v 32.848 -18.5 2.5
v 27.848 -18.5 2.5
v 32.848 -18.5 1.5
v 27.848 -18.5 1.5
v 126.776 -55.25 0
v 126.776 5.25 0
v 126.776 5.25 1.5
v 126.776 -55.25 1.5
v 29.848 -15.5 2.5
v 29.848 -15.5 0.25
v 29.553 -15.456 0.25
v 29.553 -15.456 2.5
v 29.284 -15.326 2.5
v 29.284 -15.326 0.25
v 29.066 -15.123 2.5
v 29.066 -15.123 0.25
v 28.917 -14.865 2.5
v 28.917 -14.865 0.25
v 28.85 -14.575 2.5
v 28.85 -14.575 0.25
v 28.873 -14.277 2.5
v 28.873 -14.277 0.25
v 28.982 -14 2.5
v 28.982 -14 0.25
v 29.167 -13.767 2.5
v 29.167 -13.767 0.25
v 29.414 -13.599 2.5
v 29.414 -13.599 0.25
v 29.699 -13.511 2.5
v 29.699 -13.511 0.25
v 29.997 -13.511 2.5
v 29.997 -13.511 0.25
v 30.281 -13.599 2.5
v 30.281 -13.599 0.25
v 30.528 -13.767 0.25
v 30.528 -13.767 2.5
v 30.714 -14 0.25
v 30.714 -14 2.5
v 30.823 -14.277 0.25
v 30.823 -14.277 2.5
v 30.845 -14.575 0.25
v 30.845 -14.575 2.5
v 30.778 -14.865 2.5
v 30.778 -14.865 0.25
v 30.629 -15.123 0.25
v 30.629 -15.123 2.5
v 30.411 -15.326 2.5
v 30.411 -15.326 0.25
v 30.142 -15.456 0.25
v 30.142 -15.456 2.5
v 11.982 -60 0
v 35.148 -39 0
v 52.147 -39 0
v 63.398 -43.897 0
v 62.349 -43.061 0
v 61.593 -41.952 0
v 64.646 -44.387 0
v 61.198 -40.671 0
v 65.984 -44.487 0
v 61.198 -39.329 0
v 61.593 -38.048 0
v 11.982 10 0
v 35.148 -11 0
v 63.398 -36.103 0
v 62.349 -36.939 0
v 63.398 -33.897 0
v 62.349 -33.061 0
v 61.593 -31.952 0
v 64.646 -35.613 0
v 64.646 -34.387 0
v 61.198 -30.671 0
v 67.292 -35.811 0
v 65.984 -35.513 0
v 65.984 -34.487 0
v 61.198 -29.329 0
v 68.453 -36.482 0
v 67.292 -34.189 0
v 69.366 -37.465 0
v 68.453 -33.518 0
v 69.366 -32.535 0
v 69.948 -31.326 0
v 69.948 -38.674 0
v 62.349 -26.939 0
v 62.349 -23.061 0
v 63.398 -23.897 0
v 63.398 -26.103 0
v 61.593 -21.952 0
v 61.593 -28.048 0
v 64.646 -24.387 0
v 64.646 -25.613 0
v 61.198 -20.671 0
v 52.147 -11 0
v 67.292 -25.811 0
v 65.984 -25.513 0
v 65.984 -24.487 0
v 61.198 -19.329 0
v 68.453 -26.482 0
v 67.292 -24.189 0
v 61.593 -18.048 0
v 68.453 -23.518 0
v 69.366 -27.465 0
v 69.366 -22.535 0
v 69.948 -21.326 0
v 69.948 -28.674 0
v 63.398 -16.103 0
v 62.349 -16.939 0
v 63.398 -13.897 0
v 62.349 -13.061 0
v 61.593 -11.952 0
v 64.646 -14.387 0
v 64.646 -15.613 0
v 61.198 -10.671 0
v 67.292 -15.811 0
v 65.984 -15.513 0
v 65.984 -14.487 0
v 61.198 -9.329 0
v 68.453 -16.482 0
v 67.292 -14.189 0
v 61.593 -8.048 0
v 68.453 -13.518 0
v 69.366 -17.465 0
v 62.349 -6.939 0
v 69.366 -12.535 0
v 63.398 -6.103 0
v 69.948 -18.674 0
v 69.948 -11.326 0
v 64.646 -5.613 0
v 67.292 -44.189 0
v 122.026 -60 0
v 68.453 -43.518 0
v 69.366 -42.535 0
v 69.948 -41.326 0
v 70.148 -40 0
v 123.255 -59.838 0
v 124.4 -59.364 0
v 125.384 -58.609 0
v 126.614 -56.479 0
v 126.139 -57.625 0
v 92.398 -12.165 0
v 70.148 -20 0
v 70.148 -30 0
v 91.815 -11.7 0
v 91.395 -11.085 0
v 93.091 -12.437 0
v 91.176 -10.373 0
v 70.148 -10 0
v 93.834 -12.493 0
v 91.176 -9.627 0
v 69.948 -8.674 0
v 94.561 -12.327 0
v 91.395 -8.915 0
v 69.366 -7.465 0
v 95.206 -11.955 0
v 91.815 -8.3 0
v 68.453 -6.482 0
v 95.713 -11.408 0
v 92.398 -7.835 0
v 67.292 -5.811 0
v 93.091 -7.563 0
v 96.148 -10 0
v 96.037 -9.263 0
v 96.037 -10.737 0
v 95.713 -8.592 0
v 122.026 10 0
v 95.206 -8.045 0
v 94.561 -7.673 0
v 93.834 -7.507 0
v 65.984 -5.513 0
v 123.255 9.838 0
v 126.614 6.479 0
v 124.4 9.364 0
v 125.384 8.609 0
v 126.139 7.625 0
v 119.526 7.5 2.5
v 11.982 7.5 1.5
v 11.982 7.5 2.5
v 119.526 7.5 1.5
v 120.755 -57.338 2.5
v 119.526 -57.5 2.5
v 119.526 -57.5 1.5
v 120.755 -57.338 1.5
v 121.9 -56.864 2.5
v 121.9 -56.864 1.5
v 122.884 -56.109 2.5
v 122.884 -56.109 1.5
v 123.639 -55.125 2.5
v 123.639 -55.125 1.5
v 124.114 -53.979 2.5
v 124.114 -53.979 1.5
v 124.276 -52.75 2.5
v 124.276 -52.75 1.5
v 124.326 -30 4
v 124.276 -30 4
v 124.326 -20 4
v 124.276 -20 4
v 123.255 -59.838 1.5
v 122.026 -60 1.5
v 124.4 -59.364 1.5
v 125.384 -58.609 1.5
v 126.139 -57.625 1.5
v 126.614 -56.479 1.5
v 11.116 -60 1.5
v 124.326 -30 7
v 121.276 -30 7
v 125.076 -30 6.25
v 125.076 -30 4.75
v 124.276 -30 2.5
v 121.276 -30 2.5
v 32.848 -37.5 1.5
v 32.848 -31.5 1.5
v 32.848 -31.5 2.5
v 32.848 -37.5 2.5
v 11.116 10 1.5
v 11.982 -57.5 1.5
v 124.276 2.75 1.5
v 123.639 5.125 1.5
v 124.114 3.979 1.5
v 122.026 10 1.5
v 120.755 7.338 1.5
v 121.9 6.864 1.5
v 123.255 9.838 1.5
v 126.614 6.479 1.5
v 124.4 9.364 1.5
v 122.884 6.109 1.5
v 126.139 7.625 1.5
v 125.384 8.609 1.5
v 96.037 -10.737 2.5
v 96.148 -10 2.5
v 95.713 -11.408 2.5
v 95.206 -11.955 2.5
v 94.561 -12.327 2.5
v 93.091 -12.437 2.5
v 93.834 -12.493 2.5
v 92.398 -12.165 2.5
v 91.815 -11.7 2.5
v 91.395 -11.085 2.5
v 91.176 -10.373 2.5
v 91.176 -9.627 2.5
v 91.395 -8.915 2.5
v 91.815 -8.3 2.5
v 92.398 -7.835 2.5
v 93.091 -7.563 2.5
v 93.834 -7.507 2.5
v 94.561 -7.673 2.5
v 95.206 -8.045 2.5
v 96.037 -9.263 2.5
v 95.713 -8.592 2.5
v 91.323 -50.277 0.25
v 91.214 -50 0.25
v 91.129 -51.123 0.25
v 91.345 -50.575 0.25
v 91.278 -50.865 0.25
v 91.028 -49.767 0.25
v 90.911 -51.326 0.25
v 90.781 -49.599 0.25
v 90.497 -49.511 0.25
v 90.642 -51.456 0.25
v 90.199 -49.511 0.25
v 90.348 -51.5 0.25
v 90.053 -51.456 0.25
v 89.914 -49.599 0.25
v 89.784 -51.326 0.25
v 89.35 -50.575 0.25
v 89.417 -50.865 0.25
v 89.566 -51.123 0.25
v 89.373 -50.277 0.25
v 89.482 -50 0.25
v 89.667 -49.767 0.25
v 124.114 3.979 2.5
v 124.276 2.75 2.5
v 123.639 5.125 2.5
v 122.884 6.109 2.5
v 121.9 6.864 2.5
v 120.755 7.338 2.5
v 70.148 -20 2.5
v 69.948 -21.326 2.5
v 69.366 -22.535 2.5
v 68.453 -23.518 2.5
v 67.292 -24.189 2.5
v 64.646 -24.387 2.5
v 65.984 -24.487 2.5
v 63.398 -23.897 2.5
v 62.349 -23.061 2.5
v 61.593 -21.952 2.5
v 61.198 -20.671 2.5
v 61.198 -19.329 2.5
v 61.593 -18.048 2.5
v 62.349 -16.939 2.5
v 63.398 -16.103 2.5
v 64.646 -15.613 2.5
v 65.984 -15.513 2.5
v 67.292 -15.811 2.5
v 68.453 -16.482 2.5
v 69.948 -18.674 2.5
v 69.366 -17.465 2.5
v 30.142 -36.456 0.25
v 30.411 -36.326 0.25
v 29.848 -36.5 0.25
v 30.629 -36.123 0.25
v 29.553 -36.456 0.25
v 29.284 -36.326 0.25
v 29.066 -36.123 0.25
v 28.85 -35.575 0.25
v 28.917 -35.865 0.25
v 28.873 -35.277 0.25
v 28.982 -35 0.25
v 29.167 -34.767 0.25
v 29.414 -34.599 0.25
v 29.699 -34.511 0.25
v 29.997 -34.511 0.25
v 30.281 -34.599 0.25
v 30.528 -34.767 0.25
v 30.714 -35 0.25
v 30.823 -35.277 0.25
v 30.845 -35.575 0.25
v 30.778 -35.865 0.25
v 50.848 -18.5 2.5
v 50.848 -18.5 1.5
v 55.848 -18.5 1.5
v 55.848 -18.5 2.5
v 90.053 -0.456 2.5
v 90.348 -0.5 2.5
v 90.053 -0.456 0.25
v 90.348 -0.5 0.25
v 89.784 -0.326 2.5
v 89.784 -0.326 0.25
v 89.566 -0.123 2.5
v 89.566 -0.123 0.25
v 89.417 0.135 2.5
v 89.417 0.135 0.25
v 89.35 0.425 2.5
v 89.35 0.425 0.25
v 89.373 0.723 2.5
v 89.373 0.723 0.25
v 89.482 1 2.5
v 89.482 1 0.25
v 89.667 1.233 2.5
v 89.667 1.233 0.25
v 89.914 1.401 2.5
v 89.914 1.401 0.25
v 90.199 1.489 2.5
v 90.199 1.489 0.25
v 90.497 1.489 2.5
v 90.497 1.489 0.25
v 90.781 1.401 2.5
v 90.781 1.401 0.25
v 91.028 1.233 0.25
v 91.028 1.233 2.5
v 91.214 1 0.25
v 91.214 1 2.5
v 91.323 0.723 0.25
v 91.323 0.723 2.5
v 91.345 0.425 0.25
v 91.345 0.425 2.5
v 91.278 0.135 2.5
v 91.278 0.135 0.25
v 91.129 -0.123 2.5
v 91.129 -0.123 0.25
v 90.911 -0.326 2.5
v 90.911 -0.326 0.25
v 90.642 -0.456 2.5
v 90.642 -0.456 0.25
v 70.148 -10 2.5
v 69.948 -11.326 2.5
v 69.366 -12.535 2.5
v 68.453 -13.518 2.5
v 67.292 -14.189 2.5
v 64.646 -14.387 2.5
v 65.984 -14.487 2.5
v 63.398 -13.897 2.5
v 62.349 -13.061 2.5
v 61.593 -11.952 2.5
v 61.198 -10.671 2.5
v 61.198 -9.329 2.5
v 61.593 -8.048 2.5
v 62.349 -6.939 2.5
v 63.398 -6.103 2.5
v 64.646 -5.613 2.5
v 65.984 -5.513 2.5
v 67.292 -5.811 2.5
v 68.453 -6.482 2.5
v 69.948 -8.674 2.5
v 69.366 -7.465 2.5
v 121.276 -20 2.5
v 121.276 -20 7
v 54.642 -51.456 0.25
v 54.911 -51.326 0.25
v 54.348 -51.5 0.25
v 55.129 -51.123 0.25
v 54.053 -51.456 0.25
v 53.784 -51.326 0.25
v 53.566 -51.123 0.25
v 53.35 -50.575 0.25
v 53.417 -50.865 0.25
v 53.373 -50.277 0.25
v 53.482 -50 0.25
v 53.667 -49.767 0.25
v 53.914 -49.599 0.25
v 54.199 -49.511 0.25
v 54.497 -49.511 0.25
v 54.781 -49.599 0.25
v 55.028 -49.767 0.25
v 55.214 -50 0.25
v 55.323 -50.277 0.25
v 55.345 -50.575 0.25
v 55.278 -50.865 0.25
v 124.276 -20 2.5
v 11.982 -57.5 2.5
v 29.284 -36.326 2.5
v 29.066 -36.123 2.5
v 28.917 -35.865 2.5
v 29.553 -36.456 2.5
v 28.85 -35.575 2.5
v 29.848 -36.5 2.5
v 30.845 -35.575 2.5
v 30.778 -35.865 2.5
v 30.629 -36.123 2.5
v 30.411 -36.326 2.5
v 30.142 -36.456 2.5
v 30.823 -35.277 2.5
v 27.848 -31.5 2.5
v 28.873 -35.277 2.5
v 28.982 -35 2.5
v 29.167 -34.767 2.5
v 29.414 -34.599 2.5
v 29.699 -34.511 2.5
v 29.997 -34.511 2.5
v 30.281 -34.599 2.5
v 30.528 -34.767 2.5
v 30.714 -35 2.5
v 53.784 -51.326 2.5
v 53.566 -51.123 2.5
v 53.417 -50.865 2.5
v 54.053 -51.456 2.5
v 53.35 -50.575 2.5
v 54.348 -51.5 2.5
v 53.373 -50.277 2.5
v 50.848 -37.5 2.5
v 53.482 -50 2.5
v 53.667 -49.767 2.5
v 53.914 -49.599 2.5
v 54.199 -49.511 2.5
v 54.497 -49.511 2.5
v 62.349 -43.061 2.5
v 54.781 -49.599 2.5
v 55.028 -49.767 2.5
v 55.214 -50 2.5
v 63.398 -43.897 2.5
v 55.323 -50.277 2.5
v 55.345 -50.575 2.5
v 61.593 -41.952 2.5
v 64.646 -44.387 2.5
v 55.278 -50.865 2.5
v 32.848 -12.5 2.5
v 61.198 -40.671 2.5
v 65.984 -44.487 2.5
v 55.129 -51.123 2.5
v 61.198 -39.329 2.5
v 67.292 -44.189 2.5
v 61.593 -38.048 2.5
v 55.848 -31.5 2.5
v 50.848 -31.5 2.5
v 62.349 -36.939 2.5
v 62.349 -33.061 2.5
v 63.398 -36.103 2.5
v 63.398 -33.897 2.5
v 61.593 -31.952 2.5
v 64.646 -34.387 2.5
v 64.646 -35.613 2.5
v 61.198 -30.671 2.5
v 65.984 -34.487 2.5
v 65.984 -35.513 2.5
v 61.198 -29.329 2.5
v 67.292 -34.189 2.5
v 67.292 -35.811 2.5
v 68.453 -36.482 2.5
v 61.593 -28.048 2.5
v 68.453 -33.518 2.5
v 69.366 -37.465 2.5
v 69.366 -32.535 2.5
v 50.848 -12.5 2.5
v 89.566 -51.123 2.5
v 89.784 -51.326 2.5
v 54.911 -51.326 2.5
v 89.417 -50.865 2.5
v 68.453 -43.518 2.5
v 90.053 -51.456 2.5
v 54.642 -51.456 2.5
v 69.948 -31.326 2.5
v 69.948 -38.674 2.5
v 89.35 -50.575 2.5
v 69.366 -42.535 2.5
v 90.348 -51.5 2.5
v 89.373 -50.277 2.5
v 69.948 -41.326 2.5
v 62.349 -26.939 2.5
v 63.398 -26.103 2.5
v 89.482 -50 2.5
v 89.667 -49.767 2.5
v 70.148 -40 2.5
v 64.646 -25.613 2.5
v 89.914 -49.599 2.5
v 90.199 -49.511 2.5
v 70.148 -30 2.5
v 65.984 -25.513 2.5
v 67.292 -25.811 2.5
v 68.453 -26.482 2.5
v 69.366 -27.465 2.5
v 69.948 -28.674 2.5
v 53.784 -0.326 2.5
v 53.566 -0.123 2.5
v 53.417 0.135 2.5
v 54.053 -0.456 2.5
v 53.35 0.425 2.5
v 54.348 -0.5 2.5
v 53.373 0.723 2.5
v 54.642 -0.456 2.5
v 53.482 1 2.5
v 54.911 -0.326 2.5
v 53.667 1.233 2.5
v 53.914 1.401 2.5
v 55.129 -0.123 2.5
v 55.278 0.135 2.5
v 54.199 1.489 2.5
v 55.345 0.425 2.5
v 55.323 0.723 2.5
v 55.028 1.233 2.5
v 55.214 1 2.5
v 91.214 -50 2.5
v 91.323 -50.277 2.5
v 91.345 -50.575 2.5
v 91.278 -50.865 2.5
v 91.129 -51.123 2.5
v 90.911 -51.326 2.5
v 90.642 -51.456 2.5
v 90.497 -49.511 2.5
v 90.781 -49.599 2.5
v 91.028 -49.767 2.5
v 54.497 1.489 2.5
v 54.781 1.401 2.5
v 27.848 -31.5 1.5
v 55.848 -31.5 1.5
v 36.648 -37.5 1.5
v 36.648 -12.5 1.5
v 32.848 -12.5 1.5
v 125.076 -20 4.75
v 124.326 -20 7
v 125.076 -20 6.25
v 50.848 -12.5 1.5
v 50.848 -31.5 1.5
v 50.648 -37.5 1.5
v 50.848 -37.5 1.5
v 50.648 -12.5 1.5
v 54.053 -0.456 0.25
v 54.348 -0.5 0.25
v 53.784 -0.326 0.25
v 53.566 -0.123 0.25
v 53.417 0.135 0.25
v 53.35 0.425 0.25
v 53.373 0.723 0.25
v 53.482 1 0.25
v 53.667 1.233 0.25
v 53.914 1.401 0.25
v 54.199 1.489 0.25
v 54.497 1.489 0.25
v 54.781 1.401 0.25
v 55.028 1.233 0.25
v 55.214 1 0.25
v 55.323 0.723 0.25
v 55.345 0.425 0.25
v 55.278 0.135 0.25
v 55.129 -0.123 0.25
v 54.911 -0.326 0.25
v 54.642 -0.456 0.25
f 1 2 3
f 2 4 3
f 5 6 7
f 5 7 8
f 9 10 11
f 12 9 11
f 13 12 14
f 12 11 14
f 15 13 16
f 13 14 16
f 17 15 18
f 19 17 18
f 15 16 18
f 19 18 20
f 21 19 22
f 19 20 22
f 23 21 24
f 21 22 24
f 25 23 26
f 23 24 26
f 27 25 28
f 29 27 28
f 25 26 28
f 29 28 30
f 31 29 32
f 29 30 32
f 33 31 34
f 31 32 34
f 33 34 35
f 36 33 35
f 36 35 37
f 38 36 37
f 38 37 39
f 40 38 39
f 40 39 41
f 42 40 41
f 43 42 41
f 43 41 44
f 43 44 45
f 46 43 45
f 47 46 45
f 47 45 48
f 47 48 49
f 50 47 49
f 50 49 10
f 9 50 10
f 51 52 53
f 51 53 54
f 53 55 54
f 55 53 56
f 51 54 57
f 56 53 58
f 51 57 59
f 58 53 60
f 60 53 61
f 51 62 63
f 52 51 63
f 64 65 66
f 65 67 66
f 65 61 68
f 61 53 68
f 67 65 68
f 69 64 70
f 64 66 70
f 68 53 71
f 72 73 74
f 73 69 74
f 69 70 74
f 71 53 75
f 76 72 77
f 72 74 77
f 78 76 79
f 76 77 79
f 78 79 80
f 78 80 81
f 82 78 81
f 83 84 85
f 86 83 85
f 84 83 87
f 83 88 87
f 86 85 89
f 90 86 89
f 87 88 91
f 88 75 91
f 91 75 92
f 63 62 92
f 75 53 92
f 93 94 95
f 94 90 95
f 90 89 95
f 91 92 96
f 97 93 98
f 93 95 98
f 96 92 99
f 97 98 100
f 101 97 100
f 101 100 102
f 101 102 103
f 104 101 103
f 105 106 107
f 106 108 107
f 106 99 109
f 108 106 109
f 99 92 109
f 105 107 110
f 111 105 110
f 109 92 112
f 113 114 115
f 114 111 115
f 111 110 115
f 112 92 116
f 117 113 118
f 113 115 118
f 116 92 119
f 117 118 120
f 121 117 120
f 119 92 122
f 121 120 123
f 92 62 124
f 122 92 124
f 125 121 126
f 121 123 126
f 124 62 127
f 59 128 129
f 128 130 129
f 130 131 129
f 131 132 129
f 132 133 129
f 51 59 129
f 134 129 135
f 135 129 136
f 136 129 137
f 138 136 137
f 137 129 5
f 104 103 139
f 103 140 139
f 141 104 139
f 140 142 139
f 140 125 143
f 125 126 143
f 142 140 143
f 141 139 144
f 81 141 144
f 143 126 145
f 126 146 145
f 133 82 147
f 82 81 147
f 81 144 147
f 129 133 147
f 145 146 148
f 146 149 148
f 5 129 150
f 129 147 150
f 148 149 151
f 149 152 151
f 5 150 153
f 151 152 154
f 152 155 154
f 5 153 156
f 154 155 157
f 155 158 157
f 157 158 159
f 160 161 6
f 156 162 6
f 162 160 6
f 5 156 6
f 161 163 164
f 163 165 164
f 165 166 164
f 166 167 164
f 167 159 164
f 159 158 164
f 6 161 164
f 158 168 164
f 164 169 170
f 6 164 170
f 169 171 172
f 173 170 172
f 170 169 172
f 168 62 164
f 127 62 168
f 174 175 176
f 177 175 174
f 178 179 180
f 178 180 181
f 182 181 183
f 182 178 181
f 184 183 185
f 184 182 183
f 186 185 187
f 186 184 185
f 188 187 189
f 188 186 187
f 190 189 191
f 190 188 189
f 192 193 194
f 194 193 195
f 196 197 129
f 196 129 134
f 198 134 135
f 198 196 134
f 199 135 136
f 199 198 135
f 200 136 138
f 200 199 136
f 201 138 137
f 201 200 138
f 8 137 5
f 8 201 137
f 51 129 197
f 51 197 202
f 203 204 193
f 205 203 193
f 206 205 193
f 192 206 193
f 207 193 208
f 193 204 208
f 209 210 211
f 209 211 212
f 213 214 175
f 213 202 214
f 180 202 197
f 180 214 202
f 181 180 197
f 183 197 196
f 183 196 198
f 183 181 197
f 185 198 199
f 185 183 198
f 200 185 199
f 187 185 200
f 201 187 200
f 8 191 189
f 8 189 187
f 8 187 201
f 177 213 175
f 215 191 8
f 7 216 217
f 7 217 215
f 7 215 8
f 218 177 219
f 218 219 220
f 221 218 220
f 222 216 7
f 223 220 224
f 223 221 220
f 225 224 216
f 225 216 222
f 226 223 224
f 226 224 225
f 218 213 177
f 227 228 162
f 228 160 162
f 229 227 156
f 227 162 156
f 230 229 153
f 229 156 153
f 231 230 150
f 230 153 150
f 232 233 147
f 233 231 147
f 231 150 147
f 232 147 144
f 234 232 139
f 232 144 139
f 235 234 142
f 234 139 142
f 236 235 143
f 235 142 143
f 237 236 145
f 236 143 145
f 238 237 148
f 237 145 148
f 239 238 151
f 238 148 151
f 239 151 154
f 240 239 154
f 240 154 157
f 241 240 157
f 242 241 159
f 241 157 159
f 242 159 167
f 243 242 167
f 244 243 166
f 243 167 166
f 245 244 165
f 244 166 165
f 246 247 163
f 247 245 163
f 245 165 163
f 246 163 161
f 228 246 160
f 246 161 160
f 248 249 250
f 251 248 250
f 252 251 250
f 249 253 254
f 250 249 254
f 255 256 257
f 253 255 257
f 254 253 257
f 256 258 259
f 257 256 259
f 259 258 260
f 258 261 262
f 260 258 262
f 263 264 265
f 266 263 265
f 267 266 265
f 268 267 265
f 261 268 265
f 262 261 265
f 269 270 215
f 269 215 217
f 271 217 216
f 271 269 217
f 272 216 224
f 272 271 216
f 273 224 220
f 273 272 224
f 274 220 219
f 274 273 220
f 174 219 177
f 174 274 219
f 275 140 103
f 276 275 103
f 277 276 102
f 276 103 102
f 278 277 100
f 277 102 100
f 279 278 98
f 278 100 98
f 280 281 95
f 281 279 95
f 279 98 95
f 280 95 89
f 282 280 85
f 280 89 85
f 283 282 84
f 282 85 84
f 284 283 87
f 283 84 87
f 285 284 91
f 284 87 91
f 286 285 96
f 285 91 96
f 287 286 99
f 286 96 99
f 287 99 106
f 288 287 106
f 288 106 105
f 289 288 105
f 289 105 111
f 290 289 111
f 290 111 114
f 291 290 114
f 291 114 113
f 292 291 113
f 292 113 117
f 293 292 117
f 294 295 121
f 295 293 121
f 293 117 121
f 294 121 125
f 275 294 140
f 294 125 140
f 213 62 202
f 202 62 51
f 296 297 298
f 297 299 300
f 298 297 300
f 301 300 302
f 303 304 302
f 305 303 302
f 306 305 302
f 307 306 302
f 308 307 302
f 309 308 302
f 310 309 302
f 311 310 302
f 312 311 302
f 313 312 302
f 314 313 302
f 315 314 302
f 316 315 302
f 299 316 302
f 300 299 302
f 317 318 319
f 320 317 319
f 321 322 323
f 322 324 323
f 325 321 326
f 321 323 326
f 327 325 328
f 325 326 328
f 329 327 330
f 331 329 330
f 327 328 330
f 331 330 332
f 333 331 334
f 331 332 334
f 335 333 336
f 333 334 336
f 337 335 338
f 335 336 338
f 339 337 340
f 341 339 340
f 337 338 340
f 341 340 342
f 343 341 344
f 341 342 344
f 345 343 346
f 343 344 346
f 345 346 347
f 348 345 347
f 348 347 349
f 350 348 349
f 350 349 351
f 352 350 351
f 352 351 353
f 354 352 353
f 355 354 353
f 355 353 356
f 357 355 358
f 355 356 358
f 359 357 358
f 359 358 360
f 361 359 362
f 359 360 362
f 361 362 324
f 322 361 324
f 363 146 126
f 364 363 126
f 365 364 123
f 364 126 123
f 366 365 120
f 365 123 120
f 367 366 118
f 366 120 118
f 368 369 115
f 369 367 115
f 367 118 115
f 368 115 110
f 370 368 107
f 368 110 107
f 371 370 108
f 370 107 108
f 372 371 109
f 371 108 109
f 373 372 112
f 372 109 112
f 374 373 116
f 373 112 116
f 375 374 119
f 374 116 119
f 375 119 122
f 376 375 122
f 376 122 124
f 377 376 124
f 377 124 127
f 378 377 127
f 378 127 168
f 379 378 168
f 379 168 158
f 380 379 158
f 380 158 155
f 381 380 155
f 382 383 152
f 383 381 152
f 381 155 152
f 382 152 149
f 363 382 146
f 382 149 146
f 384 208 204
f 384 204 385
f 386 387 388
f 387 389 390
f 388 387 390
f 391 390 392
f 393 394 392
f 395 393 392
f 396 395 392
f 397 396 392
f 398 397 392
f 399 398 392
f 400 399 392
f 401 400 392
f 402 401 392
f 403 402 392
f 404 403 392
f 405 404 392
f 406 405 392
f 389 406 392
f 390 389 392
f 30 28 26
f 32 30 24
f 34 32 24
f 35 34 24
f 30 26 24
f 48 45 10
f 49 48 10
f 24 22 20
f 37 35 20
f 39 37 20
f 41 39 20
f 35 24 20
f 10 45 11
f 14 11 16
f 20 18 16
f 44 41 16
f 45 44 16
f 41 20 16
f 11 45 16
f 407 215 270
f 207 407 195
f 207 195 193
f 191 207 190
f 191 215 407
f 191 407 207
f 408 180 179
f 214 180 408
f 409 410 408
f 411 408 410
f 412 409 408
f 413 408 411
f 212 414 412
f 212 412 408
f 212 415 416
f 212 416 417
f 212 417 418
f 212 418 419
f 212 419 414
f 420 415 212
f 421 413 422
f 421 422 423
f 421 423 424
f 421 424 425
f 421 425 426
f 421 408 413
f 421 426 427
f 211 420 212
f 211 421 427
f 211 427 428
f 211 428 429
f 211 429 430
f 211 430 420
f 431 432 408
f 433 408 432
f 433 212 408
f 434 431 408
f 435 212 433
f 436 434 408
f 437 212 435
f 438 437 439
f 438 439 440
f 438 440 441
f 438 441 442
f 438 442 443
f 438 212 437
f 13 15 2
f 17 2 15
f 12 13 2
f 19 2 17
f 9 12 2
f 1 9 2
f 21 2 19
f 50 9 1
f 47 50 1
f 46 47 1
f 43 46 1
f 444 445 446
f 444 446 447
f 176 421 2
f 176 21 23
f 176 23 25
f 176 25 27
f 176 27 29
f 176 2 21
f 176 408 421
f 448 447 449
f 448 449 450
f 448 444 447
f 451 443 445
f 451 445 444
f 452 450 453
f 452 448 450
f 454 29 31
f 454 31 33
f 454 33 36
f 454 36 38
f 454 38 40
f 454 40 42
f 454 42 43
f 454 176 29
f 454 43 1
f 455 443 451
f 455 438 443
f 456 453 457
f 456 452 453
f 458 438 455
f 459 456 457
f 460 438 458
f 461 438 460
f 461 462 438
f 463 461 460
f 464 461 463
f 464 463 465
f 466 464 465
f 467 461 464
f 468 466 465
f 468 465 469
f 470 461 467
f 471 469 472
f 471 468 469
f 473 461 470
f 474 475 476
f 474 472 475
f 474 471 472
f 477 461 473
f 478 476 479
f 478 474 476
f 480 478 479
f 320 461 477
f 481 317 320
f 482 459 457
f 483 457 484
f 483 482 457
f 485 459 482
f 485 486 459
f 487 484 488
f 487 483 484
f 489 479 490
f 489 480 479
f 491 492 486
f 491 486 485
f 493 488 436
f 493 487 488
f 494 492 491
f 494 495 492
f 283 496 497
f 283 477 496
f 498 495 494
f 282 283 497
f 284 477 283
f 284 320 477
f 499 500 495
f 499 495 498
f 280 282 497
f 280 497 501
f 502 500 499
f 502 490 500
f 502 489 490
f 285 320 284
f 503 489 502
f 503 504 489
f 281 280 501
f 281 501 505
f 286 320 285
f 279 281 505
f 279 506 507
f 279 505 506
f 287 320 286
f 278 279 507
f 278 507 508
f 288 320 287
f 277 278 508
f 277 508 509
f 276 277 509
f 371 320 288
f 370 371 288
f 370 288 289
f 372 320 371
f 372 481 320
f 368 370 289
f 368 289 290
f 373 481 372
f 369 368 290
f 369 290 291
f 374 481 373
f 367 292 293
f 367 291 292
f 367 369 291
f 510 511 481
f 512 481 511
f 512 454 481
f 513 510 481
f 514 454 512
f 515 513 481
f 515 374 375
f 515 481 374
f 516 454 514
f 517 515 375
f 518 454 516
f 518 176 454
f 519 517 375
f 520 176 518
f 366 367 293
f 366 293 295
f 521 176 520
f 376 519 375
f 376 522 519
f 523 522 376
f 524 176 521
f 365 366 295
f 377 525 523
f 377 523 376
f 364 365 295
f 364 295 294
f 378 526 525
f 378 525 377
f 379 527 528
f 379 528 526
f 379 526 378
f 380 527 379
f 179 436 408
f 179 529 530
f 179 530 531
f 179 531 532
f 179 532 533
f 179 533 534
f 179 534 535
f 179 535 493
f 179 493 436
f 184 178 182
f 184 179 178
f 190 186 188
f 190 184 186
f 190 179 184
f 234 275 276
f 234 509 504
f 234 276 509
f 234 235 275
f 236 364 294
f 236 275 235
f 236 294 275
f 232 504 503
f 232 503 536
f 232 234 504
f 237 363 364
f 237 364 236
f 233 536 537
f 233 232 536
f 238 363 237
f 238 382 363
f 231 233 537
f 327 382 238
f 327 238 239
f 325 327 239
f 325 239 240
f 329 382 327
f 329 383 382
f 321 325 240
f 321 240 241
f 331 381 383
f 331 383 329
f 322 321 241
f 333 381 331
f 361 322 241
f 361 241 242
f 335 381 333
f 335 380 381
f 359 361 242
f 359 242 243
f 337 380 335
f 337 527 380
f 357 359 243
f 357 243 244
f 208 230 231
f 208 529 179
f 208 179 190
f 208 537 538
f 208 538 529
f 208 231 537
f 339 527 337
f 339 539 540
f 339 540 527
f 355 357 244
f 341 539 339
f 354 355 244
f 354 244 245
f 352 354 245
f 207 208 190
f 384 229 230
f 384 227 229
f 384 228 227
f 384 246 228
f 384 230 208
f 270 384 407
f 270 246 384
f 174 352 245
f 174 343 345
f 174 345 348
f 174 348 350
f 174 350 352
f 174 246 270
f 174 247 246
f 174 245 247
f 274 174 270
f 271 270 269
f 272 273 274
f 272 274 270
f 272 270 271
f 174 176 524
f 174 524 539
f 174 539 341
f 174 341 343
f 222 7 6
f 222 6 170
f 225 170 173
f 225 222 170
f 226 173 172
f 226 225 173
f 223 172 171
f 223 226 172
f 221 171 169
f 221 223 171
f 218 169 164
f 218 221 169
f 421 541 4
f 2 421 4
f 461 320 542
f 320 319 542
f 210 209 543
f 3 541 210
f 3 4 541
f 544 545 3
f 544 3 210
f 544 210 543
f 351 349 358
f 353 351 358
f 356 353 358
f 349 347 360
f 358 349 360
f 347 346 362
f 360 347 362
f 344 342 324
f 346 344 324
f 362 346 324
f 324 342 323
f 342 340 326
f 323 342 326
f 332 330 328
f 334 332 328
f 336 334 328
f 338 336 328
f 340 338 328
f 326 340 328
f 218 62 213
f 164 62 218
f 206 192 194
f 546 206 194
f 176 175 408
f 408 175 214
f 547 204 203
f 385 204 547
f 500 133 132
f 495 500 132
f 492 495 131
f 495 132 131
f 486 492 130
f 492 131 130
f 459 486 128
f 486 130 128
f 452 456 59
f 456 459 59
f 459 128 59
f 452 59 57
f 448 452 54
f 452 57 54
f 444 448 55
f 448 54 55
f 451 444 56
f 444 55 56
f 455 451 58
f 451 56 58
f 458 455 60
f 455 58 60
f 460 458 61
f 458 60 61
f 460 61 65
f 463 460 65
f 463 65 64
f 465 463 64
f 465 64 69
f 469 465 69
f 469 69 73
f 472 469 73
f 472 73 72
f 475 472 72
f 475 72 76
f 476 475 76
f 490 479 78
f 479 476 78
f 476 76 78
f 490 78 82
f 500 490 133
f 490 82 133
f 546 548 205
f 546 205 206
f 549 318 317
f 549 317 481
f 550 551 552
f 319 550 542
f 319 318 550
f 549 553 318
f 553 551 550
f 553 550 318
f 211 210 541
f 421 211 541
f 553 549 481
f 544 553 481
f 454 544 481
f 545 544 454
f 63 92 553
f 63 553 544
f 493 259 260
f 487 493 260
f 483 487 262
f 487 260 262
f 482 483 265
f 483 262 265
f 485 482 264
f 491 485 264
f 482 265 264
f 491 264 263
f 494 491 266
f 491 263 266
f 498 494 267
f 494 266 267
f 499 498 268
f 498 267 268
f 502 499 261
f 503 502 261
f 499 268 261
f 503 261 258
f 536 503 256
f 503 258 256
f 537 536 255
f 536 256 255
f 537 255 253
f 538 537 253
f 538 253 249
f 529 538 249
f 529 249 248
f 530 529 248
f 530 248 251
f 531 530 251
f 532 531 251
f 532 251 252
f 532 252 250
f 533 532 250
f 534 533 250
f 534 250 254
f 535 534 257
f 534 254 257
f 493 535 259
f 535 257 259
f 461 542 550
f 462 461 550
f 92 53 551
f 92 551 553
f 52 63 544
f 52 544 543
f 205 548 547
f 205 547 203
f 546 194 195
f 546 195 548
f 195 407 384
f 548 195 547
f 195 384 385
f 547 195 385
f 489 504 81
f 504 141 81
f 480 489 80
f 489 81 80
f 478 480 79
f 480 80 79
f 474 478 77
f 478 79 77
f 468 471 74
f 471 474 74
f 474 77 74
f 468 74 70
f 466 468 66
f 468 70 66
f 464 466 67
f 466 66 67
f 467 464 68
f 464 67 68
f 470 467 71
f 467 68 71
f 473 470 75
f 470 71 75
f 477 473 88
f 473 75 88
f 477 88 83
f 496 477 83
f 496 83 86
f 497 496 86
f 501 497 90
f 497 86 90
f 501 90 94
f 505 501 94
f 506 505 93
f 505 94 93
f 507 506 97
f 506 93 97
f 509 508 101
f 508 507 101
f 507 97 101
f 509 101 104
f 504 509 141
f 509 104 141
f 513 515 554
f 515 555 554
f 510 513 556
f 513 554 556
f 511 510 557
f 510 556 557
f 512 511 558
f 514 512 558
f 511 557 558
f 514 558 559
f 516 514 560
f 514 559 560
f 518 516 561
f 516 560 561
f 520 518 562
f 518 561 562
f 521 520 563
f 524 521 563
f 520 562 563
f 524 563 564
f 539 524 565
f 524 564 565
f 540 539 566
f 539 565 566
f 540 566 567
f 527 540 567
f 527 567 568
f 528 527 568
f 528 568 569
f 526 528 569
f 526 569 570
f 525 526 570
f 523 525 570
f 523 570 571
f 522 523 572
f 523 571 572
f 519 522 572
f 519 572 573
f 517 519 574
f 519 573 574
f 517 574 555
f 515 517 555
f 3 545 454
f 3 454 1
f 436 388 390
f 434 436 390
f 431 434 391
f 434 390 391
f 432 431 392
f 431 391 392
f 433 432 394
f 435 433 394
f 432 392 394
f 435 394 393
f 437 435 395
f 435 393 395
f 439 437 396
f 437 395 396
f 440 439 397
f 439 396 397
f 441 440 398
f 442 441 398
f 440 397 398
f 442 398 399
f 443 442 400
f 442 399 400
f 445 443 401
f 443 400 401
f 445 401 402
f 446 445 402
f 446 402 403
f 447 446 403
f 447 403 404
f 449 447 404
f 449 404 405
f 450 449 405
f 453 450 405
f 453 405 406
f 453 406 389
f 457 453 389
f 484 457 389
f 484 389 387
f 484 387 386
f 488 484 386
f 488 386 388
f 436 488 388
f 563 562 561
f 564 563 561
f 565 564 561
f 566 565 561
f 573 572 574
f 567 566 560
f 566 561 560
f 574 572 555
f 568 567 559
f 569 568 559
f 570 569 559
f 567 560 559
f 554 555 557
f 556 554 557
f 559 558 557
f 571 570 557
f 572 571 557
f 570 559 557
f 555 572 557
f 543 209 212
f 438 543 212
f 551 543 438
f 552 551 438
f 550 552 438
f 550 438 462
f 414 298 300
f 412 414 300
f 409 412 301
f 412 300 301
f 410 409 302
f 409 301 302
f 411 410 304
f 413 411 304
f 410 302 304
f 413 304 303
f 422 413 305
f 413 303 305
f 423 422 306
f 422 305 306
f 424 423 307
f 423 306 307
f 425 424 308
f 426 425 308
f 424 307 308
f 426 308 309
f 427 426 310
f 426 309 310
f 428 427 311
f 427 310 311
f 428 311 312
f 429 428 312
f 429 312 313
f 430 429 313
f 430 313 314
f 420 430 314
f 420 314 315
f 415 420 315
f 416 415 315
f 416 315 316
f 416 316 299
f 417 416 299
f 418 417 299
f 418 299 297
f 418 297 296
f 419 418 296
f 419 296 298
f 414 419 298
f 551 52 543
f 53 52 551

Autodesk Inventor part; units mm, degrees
ref_plane "YZ Plane" through (0, 0, 0) normal (1, 0, 0) x (0, 1, 0)
ref_plane "XZ Plane" through (0, 0, 0) normal (0, 1, 0) x (-1, 0, 0)
ref_plane "XY Plane" through (0, 0, 0) normal (0, 0, 1) x (1, 0, 0)
sketch "Skizze1" plane through (0, 0, 0) normal (0, 0, 1) x (1, 0, 0)
  line L0 (11.1165, 10) -> (126.7755, 10)
  line L1 (126.7755, 10) -> (126.7755, -60)
  line L2 (126.7755, -60) -> (11.1165, -60)
  line L3 (11.1165, -60) -> (11.1165, 10)
  line L4 (36.6476, -12.5) -> (50.6476, -12.5)
  line L5 (50.6476, -12.5) -> (50.6476, -37.5)
  line L6 (50.6476, -37.5) -> (36.6476, -37.5)
  line L7 (36.6476, -37.5) -> (36.6476, -12.5)
  line L8 (126.7755, -25) -> (11.1165, -25)
  line L9 (126.7755, -36.2282) -> (128.5882, -36.2282)
  line L10 (128.5882, -36.2282) -> (128.5882, -13.7718)
  line L11 (128.5882, -13.7718) -> (126.7755, -13.7718)
  line L12 (126.7755, -13.7718) -> (126.7755, -36.2282)
  circle A0 centre (65.6476, -10) radius 4.5
  circle A1 centre (65.6476, -20) radius 4.5
  circle A2 centre (65.6476, -30) radius 4.5
  circle A3 centre (65.6476, -40) radius 4.5
  circle A4 centre (93.6476, -10) radius 2.5
  point P0 (0, 0)
  dimension "d0" = 115.659
  dimension "d1" = 70
  dimension "d2" = 25
  dimension "d3" = 14
  dimension "d65" = 9
  dimension "d66" = 9
  dimension "d67" = 9
  dimension "d68" = 9
  dimension "d69" = 10
  dimension "d70" = 10
  dimension "d71" = 10
  dimension "d73" = 10
  dimension "d74" = 15
  dimension "d75" = 25.5312
  dimension "d76" = 22.5
  dimension "d77" = 5
  dimension "d79" = 28
extrude "Extrusion1" add sketch "Skizze1" along normal blind 1.5 contours L0 L1 L8 L5 L4 L7 L3 | L8 L7 L6 L5 L1 L2 L3
sketch "Skizze2" plane through (0, 0, 1.5) normal (0, 0, 1) x (1, 0, 0)
  point P0 (0, 0)
sketch "Skizze3" plane through (0, 0, 1.5) normal (0, 0, 1) x (1, 0, 0)
  line L0 (126.7755, -60) -> (126.7755, 10)
  line L1 (124.2755, -30) -> (121.2755, -30)
  line L2 (121.2755, -30) -> (121.2755, -20)
  line L3 (121.2755, -20) -> (124.2755, -20)
  line L4 (124.2755, -20) -> (124.2755, -30)
  line L5 (126.7755, -25) -> (117.2329, -25)
  line L6 (135, -36) -> (135, -24)
  line L7 (11.1165, -60) -> (126.7755, -60) projected
  line L8 (126.7755, 10) -> (11.1165, 10) projected
  point P0 (0, 0)
  dimension "d6" = 10
  dimension "d62" = 2.5
  dimension "d63" = 3
extrude "Extrusion2" add sketch "Skizze3" along normal blind 5.5
sketch "Skizze4" plane through (124.2755, -54, 0) normal (1, 0, 0) x (0, 0, -1)
  line L0 (-7, 24) -> (-7, 36) projected
  line L1 (-1.5, 34) -> (-7, 34) projected
  line L2 (-7, 24) -> (-4, 24)
  line L3 (-4, 24) -> (-4, 34)
  line L4 (-4, 34) -> (-7, 34)
  line L5 (-7, 34) -> (-7, 24)
  line L6 (-1.5, -6) -> (-1.5, 64) projected
  point P0 (0, 54)
  point P1 (-1.5, 24)
  point P2 (-7, 34)
  dimension "d9" = 2.5
extrude "Extrusion3" add sketch "Skizze4" along normal blind 0.8
chamfer "Fase1" distance 0.75 angle 45 2 edges at (125.0755, -25, 7) (125.0755, -25, 4)
chamfer "Fase2" distance 1.5 angle 45 4 edges at (36.6476, -25, 0) (43.6476, -12.5, 0) (50.6476, -25, 0) (43.6476, -37.5, 0)
chamfer "Fase3" distance 1.5 angle 30 1 edges at (11.1165, -25, 0) measured on face at (11.1165, -13.3333, 0.5)
sketch "Skizze5" plane through (0, 0, 1.5) normal (0, 0, 1) x (1, 0, 0)
  line L0 (11.9825, 10) -> (11.9825, -60)
  line L1 (11.9825, 7.5) -> (124.2755, 7.5)
  line L2 (124.2755, 7.5) -> (124.2755, -57.5)
  line L3 (124.2755, -57.5) -> (11.9825, -57.5)
  line L4 (11.9825, -57.5) -> (11.9825, 7.5)
  line L5 (126.7755, -60) -> (126.7755, 10) projected
  line L6 (126.7755, 10) -> (11.1165, 10) projected
  line L7 (11.1165, 10) -> (11.1165, -60) projected
  line L8 (11.1165, -60) -> (126.7755, -60) projected
  line L9 (27.8476, -18.5) -> (55.8476, -18.5)
  line L10 (55.8476, -18.5) -> (55.8476, -31.5)
  line L11 (55.8476, -31.5) -> (27.8476, -31.5)
  line L12 (27.8476, -31.5) -> (27.8476, -18.5)
  line L13 (36.6476, -37.5) -> (36.6476, -12.5) projected
  line L14 (36.6476, -12.5) -> (50.6476, -12.5) projected
  line L15 (58.8722, -25) -> (36.6476, -25)
  line L16 (36.6476, -37.5) -> (50.6476, -37.5)
  line L17 (32.8476, -37.5) -> (50.8476, -37.5)
  line L18 (50.8476, -37.5) -> (50.8476, -12.5)
  line L19 (50.8476, -12.5) -> (32.8476, -12.5)
  line L20 (32.8476, -12.5) -> (32.8476, -37.5)
  line L21 (50.6476, -37.5) -> (36.6476, -37.5) projected
  line L22 (50.6476, -12.5) -> (50.6476, -37.5) projected
  circle A0 centre (93.6476, -10) radius 2.5 projected
  circle A1 centre (65.6476, -10) radius 4.5 projected
  circle A2 centre (65.6476, -20) radius 4.5 projected
  circle A3 centre (65.6476, -30) radius 4.5 projected
  circle A4 centre (65.6476, -40) radius 4.5 projected
  point P0 (0, 0)
  point P1 (135, -24)
  point P2 (36.6476, -18.5)
  point P3 (36.6476, -31.5)
  point P4 (50.8476, -31.5)
  point P5 (50.6476, -37.5)
  point P6 (36.6476, -37.5)
  point P7 (32.8476, -31.5)
  point P8 (32.8476, -18.5)
  point P9 (36.6476, -12.5)
  point P10 (50.6476, -12.5)
  point P11 (50.8476, -18.5)
  point P12 (126.7755, -13.7718)
  dimension "d21" = 2.5
  dimension "d22" = 2.5
  dimension "d24" = 2.5
  dimension "d25" = 0.866
  dimension "d26" = 28
  dimension "d27" = 13
  dimension "d28" = 8.8
  dimension "d60" = 5
  dimension "d61" = 5
  dimension "d64" = 5.2
extrude "Extrusion5" add sketch "Skizze5" along normal blind 1 contours L1 L2 L3 L0
sketch "Skizze6" plane through (0, 0, 2.5) normal (0, 0, 1) x (1, 0, 0)
  line L0 (27.8476, -31.5) -> (27.8476, -18.5) projected
  line L1 (55.8476, -18.5) -> (55.8476, -31.5) projected
  line L2 (36.6476, -12.5) -> (50.6476, -12.5) projected
  line L3 (50.6476, -37.5) -> (36.6476, -37.5) projected
  point P0 (0, 0)
  point P1 (29.8476, -35.5)
  point P2 (29.8476, -14.5)
  point P3 (54.3476, -50.5)
  point P4 (54.3476, 0.5)
  point P5 (90.3476, -50.5)
  point P6 (90.3476, 0.5)
  dimension "d36" = 2
  dimension "d37" = 2
  dimension "d38" = 1.5
  dimension "d39" = 1.5
  dimension "d42" = 2
  dimension "d80" = 13
  dimension "d81" = 13
  dimension "d82" = 2
  dimension "d83" = 36
  dimension "d84" = 36
hole "Bohrung1" at (29.8476, -35.5, 2.5) at (29.8476, -14.5, 2.5) at (54.3476, -50.5, 2.5) at (54.3476, 0.5, 2.5) at (90.3476, -50.5, 2.5) at (90.3476, 0.5, 2.5) direction (0, 0, -1) diameter 2 depth 2.25
fillet "Rundung1" radius 4.75 4 edges at (126.7755, 10, 0.75) (126.7755, -60, 0.75) (124.2755, -57.5, 2) (124.2755, 7.5, 2)
properties part number "Case top"
